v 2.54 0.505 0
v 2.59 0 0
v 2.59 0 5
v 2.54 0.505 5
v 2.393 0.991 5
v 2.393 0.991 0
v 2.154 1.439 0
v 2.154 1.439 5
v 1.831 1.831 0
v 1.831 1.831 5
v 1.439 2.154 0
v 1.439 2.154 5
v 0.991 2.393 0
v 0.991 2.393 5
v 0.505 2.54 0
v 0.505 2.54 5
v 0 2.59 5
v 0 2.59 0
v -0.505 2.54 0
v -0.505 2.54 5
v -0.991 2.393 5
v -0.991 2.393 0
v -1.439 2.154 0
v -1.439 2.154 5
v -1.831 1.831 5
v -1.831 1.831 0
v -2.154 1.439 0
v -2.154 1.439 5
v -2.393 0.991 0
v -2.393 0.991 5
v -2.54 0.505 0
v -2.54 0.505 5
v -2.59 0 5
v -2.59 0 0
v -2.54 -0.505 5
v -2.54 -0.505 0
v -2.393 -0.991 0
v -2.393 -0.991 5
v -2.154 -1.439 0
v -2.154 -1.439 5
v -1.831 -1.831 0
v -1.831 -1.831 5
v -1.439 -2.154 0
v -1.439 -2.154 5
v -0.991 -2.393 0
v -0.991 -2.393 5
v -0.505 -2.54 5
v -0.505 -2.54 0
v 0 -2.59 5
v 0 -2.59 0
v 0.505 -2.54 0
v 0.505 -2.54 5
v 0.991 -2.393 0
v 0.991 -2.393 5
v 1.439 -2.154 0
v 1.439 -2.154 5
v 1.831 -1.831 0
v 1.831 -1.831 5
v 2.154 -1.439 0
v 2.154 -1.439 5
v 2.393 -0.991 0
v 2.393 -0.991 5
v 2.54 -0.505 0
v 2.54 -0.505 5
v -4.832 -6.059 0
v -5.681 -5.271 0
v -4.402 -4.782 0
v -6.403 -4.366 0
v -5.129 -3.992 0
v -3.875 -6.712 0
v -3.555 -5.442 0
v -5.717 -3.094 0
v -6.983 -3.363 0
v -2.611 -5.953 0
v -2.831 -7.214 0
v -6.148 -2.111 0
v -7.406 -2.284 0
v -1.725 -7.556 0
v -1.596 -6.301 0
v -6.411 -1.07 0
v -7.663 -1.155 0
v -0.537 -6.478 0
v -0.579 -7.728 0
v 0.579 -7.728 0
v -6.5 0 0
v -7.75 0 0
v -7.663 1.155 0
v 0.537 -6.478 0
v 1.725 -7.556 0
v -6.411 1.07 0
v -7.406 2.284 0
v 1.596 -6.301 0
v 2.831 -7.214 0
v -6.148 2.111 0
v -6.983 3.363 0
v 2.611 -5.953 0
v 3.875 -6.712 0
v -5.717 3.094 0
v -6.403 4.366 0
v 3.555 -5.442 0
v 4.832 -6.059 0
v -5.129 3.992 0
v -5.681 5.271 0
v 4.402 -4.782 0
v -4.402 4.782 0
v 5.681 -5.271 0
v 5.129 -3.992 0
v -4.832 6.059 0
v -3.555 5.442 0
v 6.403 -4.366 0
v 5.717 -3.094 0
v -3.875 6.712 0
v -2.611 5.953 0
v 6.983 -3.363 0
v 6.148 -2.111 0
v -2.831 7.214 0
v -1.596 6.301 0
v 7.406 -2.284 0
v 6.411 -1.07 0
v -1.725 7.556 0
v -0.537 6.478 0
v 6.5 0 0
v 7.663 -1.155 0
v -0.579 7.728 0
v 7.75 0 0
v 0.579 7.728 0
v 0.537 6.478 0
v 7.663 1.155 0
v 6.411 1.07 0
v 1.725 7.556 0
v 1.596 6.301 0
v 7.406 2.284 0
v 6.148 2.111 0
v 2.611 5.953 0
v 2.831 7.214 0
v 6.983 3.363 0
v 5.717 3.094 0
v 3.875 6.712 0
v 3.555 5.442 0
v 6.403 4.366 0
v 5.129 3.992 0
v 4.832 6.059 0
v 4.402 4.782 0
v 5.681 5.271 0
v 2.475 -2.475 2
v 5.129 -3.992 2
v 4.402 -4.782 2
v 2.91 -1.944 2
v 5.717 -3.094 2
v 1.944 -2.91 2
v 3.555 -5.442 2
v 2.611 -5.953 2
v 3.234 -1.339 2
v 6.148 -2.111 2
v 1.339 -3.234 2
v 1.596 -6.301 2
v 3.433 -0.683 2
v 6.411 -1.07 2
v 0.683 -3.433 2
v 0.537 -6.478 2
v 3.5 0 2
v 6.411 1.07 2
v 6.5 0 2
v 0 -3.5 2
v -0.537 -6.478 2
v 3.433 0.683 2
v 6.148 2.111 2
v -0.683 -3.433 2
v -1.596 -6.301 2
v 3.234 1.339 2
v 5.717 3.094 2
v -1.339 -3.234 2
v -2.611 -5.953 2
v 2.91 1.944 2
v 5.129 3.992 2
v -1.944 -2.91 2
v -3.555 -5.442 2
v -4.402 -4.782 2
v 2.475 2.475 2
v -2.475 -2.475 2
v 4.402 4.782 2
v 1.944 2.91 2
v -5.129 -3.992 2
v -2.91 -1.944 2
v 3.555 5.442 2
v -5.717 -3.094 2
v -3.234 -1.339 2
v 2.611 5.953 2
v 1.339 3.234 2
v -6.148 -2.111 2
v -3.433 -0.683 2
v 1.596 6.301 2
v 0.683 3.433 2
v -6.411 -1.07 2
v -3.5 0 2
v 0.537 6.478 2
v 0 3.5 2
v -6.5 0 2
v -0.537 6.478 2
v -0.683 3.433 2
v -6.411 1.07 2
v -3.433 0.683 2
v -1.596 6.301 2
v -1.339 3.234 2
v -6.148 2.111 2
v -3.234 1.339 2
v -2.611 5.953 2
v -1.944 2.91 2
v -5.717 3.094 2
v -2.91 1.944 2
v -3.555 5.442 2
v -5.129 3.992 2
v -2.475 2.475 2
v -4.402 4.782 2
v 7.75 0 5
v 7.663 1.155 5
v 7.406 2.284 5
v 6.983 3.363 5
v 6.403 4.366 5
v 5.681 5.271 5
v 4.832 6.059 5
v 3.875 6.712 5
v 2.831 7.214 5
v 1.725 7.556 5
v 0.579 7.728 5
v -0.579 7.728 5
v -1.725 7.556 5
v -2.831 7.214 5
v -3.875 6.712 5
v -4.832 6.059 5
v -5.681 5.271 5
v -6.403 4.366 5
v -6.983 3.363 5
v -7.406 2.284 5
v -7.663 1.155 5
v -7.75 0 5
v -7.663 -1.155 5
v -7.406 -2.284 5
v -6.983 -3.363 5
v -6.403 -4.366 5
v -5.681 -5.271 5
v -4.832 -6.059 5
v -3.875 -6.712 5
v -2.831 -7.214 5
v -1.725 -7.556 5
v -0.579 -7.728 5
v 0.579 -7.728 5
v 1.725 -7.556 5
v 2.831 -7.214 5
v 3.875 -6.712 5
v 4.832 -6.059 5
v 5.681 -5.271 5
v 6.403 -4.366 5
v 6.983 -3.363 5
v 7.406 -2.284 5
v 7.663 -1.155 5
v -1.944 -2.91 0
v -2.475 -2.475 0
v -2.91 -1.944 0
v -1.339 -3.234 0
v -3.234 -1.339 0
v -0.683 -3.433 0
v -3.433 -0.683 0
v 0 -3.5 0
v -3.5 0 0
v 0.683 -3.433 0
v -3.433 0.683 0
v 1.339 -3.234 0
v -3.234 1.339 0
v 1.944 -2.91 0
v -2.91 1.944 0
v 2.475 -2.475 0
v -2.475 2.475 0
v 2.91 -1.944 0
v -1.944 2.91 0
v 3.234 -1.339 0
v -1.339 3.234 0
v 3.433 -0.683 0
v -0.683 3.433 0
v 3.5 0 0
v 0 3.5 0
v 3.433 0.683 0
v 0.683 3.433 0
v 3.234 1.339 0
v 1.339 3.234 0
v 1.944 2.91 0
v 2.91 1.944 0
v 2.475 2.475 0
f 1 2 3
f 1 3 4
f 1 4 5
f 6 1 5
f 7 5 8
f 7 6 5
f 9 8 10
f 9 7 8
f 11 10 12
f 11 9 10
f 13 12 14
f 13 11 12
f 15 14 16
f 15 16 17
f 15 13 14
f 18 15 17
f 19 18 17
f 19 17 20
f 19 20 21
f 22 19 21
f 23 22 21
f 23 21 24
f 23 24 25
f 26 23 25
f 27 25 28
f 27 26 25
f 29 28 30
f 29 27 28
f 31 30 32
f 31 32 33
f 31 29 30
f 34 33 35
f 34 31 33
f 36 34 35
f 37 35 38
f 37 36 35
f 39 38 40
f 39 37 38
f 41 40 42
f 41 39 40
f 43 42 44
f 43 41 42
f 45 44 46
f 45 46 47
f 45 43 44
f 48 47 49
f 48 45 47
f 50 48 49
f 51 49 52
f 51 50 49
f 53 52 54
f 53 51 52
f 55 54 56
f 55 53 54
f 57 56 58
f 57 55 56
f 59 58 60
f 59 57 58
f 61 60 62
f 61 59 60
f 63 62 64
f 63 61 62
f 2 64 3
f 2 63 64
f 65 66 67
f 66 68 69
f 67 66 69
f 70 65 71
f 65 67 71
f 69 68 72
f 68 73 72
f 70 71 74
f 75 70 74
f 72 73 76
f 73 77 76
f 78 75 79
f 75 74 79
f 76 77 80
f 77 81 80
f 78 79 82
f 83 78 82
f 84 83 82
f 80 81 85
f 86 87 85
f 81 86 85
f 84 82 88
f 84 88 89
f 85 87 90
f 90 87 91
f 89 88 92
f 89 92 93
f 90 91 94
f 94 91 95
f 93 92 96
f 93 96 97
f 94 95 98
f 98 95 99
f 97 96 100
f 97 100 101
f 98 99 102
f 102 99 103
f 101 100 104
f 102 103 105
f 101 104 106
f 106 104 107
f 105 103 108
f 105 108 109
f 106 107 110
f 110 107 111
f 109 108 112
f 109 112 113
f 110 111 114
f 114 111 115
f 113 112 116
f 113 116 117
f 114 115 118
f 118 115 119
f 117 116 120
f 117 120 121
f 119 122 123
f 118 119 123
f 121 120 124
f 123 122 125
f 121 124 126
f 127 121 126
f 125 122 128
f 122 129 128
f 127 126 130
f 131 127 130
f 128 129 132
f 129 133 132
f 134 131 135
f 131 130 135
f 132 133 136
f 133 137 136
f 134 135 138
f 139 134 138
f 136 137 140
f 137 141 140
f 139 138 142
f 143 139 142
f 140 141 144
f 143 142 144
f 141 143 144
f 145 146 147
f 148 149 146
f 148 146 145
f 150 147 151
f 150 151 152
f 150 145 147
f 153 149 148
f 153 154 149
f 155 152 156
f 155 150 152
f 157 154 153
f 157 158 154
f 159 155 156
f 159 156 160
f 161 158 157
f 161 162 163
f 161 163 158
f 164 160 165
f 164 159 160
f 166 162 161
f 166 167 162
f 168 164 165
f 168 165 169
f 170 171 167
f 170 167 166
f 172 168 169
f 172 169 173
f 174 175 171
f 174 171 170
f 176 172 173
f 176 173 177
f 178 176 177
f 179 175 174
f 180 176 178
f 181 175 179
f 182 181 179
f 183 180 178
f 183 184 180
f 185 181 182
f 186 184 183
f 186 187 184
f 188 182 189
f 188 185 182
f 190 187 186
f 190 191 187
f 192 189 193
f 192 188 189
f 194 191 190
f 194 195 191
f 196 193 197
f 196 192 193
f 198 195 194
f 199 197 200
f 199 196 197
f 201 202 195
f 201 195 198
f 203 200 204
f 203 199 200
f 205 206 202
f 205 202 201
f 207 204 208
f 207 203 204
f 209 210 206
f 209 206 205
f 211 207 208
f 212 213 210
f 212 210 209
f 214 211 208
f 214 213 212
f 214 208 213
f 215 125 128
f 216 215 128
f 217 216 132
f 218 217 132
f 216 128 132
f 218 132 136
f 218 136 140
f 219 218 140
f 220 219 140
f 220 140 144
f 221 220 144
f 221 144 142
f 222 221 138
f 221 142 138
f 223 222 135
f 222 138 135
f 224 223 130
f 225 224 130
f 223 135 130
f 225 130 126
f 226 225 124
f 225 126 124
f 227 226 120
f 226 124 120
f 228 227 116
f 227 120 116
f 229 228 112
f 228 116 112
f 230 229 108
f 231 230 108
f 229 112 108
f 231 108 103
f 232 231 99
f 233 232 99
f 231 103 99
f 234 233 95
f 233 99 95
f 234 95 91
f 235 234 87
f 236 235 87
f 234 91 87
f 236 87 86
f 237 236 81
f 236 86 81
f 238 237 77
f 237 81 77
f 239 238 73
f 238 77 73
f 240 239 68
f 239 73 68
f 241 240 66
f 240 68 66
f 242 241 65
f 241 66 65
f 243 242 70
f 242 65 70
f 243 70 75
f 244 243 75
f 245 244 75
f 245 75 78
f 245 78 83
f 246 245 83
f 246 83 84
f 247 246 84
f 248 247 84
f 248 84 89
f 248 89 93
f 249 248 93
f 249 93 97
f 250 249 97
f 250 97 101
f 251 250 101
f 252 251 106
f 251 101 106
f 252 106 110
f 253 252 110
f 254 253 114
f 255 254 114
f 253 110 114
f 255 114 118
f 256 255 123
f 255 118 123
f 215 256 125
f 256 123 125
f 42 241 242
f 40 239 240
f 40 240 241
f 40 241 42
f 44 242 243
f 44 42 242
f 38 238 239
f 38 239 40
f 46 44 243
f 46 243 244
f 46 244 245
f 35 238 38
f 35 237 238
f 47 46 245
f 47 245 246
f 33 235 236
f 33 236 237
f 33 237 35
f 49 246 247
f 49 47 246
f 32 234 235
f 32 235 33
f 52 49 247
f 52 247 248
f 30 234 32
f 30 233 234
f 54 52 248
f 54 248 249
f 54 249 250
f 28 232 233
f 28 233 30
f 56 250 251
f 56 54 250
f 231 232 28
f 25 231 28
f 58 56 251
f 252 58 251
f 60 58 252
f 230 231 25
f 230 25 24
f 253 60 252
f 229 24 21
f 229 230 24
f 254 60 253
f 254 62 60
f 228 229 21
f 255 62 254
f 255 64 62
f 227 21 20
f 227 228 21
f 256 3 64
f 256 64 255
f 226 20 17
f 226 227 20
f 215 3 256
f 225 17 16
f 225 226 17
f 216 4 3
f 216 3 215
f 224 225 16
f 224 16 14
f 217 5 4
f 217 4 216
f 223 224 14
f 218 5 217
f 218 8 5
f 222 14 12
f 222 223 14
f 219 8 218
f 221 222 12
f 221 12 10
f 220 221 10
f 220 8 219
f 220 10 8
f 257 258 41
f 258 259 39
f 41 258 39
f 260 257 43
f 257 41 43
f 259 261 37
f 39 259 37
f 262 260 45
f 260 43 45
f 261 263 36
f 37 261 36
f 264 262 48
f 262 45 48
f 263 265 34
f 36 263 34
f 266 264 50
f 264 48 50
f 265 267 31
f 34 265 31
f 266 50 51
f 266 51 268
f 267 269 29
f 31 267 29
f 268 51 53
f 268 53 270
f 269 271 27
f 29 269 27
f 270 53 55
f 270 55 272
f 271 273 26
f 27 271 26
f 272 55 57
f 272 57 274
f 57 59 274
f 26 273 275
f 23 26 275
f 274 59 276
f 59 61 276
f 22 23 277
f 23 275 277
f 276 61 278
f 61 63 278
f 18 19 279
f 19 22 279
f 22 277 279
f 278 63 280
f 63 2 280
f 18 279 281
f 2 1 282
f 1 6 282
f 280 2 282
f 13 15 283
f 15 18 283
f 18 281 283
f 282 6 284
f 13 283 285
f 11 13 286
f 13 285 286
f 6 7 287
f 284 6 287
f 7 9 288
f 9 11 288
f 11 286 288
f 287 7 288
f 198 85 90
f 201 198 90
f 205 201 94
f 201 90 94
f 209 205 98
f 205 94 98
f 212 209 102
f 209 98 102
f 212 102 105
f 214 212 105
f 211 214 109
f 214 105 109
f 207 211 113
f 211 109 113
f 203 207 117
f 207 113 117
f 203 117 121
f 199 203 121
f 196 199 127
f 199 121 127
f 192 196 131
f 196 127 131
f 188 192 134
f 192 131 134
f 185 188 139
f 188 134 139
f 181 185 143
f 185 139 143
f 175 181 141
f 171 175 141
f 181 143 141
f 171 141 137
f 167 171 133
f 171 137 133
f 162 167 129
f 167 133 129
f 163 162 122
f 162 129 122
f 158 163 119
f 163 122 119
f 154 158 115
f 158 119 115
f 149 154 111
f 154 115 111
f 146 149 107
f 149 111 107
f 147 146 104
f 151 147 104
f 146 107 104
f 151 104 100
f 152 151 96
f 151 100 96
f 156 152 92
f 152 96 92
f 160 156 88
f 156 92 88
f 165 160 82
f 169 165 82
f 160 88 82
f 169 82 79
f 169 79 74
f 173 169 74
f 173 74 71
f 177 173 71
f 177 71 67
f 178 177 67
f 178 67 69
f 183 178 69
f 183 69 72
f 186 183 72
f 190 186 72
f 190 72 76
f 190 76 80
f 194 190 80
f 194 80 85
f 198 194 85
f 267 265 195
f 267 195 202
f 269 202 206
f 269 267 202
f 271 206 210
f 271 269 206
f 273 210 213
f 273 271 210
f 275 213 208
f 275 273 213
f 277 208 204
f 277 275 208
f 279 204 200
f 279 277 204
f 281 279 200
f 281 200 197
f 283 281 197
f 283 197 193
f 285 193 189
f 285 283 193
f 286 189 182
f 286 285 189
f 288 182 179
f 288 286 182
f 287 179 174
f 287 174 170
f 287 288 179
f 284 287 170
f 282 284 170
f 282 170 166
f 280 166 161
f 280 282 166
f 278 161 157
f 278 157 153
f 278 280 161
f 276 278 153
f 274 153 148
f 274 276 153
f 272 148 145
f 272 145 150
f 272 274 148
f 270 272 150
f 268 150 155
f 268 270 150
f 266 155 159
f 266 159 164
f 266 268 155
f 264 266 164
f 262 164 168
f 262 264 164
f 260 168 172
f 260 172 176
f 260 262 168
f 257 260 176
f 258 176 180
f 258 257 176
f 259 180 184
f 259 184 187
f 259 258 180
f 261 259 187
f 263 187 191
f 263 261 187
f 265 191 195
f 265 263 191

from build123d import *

# Parameters (mm, degrees)
SKETCH1_R           = 7.75
SKETCH1_R_2         = 2.59
BOSS_EXTRUDE1_DEPTH = 5
SKETCH2_R           = 6.5
SKETCH2_R_2         = 3.5
CUT_EXTRUDE1_DEPTH  = 2


with BuildPart() as part:
    # Sketch1 → Boss-Extrude1 (new body)
    with BuildSketch(Plane.XY):
        Circle(SKETCH1_R)
        Circle(SKETCH1_R_2, mode=Mode.SUBTRACT)
    extrude(amount=BOSS_EXTRUDE1_DEPTH)

    # Sketch2 → Cut-Extrude1 (cut)
    with BuildSketch(Plane(origin=(0, 0, 0), x_dir=(-1, 0, 0), z_dir=(0, 0, -1))):
        Circle(SKETCH2_R)
        Circle(SKETCH2_R_2, mode=Mode.SUBTRACT)
    extrude(amount=-CUT_EXTRUDE1_DEPTH, mode=Mode.SUBTRACT)


solid = part.part
